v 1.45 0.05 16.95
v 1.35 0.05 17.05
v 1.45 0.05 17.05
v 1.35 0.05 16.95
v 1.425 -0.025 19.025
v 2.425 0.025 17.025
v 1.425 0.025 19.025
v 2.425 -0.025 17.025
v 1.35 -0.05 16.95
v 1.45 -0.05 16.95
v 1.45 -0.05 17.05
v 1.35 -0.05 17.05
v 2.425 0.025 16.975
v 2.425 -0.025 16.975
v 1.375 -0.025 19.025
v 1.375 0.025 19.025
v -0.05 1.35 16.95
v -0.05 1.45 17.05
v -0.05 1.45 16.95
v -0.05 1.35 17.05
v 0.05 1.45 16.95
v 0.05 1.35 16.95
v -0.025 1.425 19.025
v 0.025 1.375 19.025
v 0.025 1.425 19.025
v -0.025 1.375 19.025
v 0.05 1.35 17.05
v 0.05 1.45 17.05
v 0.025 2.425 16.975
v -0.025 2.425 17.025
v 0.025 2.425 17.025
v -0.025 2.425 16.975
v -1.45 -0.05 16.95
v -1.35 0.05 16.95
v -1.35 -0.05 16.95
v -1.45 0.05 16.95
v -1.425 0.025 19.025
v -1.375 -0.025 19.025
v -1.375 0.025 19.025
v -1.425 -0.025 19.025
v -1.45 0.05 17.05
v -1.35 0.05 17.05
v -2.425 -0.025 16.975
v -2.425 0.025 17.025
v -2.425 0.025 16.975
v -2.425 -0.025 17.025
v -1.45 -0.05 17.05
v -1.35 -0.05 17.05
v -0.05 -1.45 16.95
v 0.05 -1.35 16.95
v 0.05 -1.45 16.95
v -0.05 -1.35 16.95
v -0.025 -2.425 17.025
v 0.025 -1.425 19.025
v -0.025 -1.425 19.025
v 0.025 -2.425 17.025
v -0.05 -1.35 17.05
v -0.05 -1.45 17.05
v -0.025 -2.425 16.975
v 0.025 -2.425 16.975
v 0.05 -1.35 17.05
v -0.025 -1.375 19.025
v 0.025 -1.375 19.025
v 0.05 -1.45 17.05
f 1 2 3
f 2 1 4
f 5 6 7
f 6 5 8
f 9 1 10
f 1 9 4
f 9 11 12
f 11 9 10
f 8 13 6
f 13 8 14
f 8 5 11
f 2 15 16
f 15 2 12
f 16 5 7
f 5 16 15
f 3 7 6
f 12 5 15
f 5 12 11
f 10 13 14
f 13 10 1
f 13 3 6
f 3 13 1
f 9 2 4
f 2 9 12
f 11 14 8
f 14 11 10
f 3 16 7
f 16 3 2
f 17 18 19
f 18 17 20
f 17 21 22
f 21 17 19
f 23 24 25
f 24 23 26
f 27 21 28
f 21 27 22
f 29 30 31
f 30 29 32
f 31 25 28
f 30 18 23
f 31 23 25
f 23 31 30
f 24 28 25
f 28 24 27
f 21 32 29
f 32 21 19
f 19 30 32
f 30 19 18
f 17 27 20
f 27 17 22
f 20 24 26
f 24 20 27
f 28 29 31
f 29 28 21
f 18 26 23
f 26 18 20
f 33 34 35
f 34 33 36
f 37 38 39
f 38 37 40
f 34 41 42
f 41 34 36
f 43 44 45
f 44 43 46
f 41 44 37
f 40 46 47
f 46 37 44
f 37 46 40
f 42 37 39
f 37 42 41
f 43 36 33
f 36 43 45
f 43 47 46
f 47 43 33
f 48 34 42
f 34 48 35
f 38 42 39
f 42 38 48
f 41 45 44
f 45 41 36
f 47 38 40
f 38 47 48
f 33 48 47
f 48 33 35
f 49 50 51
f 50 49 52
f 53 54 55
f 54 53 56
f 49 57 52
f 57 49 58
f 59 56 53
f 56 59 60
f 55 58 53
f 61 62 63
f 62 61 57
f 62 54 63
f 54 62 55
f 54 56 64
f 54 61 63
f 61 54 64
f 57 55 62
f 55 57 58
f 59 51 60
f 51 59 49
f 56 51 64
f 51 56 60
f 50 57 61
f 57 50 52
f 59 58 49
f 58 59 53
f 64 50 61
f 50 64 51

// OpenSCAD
use <lib.scad>

module nose() {
	scale([0.3,0.3,0.3]) intersection() {
		hull() {
			translate([0,0,-5]) scale([1,1,0.75]) BezCone(d=8.2,h=20,curve=5.1,steps=$fn);
			translate([0,0,9.5]) sphere(r=0.5);
		}
		translate([0,0,5]) box([10,10,10]);
	}
}

module body() {
	translate([0,0,10]) cyl(1.5,1.5,20);
}

module launchpad() {
	difference() {
		translate([0,0,1.5]) box([12,12,3]);
		translate([0,0,2.25]) cyl(2,2,2.0);
	}
}

module base() {
	translate([0,0,0.2]) difference() {
		box([3.5,3.5,0.5]);
		translate([2,2,0]) box([3,3,1]);
		translate([-2,2,0]) box([3,3,1]);
		translate([-2,-2,0]) box([3,3,1]);
		translate([2,-2,0]) box([3,3,1]);
	}
}

module leg() {
	union() {
		translate([1.8,0,0.25]) rotate([0,0,0]) hull() {
			translate([0,0.8,0]) sphere(0.25);
			translate([0,-0.8,0]) sphere(0.25);
			translate([0,0,5]) sphere(0.25);
		}
		hull() {
			translate([3,0,0.25]) box([0.1,0.1,0.1]);
			translate([2,0,0.25]) box([0.1,0.1,0.1]);
			translate([2,0,5]) box([0.1,0.1,0.1]);
		}
	}
}

module raptor() {
	intersection() {
		translate([0,0,-1]) BezCone(d=2,h=4,curve=1,steps=$fn);
		translate([0,0,2.5]) box([5,5,5]);
	}
}

module plume() {
	translate([0,0,3.25]) rotate([180,0,0]) BezCone(d=2,h=20,curve=1,steps=$fn);
}

hd = 32;
ld = 16;
raise = 6;

hdFin = 8;
ldFin = 4;

//translate([0,0,20+raise]) nose($fn=ld);
//translate([0,0,0+raise]) body($fn=ld);
//translate([0,0,0+raise]) base($fn=hd);
//translate([0,0,0+raise]) rotate([0,0,0]) leg($fn=ld/2);
//translate([0,0,0+raise]) rotate([0,0,90]) leg($fn=hd);
//translate([0,0,0+raise]) rotate([0,0,180]) leg($fn=hd);
//translate([0,0,0+raise]) rotate([0,0,270]) leg($fn=hd);
//
//rotate([0,0,0]) translate([0,0,4]) raptor($fn=hd);
//%rotate([0,0,0]) translate([0,0,1]) plume($fn=hd);
//
//launchpad($fn=hd);

module bodyHD($fn=hd) {
	hull() {
		translate([0,0,20]) nose($fn=hd);
		body($fn=hd);
	}
}

//translate([10,0,0]) bodyHD();

module bodyHD2($fn=hd) {
	union() {
		translate([0,0,22.5]) hull() {
			sphere(0.5);
			translate([0,0,-3]) sphere(1.4);
			translate([0,0,-6]) cyl(1.4,1.4,1);
			translate([0,0,-7]) cyl(1,1,1);
		}
		translate([0,0,10.1]) cyl(1.2,1.2,20);
		translate([0,0,3]) hull() {
			cyl(1.5,1.5,6);
			translate([0,0,7]) cyl(0.5,0.5,1);
		}
	}
}

//bodyHD2();

module finsHD() {
	union() {
		for (i = [0:90:360]) translate([0,0,17]) rotate([0,0,i]) hull() {
			translate([1.4,0,0]) box([0.1,0.1,0.1]);
			translate([1.4,0,2]) box([0.05,0.05,0.05]);
			translate([2.4,0,0]) box([0.05,0.05,0.05]);
		}
//		for (i = [0:90:360]) translate([0,0,1]) rotate([0,0,i+45]) hull() {
//			translate([1.4,0,0]) box([0.1,0.1,0.1]);
//			translate([1.4,0,5]) box([0.05,0.05,0.05]);
//			translate([3,0,-2]) box([0.05,0.05,0.05]);
//		}
	}
}

finsHD();

module bodyLD2($fn=ld) {
	union() {
		translate([0,0,22.5]) hull() {
			sphere(0.5);
			translate([0,0,-3]) sphere(1.4);
			translate([0,0,-6]) cyl(1.4,1.4,1);
			translate([0,0,-7]) cyl(1,1,1);
		}
		translate([0,0,10.1]) cyl(1.2,1.2,20);
		translate([0,0,3]) hull() {
			cyl(1.5,1.5,6);
			translate([0,0,7]) cyl(0.5,0.5,1);
		}
	}
}

//bodyLD2();


//raptor($fn=ld);
//launchpad($fn=ld);
//translate([-1.8,0,-0.25]) leg($fn=ld/2);
//base($fn=hd);
